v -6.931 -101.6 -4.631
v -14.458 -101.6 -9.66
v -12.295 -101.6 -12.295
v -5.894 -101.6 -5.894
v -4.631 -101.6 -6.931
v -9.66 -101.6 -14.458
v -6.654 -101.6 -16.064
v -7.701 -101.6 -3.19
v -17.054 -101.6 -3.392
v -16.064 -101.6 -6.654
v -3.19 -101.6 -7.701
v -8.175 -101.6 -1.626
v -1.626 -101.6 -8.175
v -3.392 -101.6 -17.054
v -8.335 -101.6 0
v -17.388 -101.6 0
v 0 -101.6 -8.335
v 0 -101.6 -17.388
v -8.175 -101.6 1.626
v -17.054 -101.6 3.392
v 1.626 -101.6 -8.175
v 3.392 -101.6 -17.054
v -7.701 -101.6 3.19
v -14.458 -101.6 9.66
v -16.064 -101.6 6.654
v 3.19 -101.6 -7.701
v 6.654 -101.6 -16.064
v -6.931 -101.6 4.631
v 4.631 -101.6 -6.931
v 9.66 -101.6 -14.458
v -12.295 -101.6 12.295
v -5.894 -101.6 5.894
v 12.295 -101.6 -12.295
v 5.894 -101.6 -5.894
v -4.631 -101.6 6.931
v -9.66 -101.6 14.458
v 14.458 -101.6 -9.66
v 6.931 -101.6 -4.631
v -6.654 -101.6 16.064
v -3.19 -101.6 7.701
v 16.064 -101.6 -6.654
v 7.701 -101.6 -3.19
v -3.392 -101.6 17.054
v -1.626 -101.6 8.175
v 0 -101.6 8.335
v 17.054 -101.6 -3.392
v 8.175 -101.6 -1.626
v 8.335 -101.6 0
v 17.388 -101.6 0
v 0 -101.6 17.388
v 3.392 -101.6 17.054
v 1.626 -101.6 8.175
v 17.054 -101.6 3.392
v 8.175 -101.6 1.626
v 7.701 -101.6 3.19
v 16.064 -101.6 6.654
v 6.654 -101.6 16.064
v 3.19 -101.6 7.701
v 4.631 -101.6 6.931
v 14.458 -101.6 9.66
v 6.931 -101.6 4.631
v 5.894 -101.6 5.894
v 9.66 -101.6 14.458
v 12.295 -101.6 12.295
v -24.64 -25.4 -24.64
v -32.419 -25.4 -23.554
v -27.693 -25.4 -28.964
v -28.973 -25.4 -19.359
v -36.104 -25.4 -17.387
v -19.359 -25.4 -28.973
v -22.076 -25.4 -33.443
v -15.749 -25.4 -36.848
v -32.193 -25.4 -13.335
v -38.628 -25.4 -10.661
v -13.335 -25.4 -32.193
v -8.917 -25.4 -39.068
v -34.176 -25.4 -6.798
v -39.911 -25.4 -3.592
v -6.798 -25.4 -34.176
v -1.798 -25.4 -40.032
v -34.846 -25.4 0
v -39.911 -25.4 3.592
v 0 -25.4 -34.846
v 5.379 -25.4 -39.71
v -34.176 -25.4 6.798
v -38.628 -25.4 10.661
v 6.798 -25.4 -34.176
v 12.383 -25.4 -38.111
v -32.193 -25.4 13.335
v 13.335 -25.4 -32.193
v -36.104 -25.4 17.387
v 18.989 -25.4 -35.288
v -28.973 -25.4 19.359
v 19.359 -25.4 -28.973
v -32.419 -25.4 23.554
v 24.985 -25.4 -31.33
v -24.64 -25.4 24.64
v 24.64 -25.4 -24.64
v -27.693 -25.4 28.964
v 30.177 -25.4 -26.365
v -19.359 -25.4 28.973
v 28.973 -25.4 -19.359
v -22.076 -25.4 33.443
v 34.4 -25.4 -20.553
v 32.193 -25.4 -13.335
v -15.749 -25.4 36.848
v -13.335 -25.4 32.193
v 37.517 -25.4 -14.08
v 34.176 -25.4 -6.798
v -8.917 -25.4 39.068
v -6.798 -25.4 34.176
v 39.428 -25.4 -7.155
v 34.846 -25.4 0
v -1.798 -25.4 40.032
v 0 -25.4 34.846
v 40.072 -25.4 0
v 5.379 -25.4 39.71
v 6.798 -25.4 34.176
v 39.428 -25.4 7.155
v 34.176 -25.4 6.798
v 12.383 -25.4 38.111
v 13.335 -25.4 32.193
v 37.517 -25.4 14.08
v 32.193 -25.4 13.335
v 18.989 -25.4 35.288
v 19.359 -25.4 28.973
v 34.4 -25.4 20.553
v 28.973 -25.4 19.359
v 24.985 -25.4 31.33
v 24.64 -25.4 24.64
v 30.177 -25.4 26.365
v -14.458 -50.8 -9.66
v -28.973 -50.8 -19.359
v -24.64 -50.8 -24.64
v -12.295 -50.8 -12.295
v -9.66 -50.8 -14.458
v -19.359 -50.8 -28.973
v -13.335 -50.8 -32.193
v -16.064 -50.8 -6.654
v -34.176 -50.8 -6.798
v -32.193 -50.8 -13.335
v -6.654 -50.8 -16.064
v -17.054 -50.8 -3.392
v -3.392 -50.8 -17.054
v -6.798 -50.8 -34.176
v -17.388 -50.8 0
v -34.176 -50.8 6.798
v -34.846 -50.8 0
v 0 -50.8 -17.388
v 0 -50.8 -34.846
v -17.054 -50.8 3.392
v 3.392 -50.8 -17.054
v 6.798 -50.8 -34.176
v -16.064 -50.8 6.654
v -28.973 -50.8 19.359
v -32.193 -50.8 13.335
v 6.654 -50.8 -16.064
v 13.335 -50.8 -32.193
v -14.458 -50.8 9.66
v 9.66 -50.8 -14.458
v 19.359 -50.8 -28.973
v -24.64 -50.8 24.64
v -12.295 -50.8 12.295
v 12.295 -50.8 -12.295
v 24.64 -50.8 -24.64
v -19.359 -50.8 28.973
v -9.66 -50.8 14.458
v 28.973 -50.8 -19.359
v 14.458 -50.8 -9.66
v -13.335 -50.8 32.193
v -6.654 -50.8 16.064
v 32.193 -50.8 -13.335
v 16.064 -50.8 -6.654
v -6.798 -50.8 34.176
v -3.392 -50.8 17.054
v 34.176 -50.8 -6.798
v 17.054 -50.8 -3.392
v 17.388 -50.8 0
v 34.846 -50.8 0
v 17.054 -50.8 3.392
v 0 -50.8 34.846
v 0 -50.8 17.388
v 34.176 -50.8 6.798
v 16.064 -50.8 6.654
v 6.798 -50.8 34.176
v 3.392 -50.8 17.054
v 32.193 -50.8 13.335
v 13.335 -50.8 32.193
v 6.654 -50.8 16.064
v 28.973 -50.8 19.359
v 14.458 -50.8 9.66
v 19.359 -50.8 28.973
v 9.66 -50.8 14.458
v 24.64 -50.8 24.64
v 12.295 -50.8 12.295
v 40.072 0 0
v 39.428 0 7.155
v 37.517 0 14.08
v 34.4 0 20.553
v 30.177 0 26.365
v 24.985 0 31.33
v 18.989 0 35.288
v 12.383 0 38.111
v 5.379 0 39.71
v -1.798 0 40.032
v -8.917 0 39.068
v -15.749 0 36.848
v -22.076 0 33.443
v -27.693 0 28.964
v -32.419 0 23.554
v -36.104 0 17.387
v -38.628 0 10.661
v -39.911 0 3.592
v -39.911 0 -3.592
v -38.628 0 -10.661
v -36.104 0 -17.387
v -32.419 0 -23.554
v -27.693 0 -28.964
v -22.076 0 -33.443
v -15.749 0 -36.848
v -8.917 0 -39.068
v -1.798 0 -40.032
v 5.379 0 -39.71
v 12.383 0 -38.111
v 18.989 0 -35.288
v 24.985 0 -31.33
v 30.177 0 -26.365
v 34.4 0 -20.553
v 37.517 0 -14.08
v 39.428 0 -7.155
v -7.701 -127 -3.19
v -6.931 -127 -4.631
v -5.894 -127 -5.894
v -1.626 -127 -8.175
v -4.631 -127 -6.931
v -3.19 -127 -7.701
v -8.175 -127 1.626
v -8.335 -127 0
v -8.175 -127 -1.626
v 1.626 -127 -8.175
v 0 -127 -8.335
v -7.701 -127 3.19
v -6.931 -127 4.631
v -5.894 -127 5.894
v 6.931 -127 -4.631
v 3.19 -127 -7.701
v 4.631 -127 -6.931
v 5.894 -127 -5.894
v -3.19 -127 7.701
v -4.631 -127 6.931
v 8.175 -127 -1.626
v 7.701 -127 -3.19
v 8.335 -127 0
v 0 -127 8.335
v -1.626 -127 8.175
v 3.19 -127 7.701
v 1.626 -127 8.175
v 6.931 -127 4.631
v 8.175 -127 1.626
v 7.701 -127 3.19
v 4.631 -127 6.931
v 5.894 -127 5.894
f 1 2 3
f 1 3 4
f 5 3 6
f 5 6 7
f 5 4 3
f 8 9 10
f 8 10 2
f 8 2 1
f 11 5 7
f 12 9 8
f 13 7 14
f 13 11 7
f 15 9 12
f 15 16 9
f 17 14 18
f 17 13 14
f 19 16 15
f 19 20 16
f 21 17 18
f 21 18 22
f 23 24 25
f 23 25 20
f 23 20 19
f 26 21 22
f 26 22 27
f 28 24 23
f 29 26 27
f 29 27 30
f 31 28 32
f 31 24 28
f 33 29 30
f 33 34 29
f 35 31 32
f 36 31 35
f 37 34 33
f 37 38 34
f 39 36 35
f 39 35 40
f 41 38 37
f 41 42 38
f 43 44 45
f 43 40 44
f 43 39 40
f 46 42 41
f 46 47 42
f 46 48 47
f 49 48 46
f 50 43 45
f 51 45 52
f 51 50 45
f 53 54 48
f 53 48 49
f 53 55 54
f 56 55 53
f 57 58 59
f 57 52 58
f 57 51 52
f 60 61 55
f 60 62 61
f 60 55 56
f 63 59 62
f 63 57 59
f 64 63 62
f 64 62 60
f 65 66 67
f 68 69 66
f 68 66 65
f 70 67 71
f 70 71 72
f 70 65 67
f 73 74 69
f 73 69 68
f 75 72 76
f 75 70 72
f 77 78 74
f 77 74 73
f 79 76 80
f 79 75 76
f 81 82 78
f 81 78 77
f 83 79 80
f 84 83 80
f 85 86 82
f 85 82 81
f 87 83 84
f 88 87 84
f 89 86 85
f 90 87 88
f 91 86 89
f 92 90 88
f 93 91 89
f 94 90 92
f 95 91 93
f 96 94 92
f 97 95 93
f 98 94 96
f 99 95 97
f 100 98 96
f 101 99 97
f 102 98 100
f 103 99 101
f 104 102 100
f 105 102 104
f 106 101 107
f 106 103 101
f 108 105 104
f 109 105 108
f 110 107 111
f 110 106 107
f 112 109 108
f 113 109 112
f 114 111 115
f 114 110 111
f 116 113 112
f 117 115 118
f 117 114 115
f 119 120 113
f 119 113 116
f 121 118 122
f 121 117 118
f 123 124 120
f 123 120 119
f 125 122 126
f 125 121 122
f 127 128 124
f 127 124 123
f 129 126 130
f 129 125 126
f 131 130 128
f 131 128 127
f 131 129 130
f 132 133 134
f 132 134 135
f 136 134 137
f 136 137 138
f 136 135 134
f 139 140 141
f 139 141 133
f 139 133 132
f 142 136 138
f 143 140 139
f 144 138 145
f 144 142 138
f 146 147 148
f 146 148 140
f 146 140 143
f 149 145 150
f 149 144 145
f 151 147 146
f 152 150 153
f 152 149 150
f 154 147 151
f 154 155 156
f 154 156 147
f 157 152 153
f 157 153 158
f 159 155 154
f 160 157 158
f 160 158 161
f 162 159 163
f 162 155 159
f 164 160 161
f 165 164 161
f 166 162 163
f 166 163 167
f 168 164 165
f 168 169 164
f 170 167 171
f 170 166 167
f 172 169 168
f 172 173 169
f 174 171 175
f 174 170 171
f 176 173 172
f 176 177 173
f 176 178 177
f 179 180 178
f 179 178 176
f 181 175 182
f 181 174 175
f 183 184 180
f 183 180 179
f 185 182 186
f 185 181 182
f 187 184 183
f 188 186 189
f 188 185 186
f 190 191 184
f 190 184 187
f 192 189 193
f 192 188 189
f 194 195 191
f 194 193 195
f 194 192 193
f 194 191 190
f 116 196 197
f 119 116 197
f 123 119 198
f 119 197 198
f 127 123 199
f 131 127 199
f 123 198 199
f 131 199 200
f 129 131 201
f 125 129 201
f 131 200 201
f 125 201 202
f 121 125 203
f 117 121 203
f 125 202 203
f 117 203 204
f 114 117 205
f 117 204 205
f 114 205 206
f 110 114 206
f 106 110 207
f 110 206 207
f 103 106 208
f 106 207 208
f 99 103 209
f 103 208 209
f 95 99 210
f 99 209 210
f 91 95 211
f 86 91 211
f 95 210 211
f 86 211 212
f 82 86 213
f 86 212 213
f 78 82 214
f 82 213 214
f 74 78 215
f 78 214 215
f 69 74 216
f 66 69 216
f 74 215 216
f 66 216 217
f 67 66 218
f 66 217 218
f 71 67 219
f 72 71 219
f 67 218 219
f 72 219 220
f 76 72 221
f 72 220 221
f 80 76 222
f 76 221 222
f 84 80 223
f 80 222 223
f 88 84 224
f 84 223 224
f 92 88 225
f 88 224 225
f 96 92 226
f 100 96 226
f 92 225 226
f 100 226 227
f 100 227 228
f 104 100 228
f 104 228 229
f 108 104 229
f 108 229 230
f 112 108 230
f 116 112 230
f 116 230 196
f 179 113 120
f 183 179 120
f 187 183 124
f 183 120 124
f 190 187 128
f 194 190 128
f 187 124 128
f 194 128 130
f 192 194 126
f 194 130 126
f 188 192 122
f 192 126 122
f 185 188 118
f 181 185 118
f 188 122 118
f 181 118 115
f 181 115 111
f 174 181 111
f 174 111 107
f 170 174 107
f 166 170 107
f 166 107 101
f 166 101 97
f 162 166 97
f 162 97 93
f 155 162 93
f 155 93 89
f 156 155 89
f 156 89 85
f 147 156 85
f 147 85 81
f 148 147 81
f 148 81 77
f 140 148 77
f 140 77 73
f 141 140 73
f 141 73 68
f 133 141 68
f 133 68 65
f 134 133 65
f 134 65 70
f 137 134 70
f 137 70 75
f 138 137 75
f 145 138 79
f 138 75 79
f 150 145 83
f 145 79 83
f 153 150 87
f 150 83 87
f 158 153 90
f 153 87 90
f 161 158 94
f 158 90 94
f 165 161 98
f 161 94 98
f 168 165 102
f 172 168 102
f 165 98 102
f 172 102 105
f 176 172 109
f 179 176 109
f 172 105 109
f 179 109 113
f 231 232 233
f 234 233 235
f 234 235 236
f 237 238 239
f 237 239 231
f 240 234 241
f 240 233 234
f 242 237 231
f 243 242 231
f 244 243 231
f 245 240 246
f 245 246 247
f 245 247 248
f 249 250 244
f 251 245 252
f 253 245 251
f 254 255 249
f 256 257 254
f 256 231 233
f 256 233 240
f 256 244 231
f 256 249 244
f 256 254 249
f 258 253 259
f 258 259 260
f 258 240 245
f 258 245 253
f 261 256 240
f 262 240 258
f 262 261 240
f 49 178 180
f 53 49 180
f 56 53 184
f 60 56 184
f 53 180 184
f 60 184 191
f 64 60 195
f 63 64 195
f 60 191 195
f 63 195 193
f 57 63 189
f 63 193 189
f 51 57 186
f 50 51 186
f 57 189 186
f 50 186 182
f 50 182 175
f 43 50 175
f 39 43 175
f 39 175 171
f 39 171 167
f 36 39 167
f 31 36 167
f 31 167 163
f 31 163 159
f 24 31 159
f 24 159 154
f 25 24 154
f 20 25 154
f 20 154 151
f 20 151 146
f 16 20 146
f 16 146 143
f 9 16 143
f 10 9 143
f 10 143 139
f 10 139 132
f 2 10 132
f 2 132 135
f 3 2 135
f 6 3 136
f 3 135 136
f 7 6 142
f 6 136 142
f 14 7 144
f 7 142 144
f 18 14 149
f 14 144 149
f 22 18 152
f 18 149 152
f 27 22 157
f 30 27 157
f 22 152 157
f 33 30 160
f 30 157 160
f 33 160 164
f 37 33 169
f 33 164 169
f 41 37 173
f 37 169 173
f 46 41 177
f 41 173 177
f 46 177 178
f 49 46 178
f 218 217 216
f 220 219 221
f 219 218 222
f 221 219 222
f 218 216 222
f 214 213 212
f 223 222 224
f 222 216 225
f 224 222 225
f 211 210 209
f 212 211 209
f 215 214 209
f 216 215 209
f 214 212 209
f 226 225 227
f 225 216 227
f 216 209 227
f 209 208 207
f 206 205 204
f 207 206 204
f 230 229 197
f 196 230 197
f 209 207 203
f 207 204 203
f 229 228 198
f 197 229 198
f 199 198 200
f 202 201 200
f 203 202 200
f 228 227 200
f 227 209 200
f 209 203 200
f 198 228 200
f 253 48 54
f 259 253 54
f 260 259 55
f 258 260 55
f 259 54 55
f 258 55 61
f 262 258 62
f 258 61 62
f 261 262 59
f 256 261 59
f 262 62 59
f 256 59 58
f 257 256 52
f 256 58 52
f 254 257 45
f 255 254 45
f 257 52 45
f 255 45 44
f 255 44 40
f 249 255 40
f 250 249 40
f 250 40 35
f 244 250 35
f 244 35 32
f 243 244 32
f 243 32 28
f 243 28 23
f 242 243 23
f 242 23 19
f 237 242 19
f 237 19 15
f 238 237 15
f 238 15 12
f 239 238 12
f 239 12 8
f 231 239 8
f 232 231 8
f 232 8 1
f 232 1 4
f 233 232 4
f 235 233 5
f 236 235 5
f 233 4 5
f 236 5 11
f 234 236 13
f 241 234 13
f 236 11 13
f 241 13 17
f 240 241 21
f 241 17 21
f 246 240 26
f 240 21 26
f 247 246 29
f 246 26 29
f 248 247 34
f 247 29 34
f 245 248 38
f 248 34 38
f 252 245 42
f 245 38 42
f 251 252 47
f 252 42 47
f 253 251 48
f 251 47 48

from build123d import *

# Parameters (mm, degrees)
F0_R     = 40.072412
F0_R_2   = 34.84556
F1_DEPTH = 25.4
F0_R_3   = 17.387916
F2_DEPTH = 50.8
F0_R_4   = 8.335342
F3_DEPTH = 101.6
F4_DEPTH = 127


with BuildPart() as f1:
    # F0 (on Front) → F1 (new body)
    with BuildSketch(Plane.XZ):
        Circle(F0_R)
        Circle(F0_R_2, mode=Mode.SUBTRACT)
    extrude(amount=F1_DEPTH)

    # F0 (on Front) → F2 (join)
    with BuildSketch(Plane.XZ):
        Circle(F0_R_2)
        Circle(F0_R_3, mode=Mode.SUBTRACT)
    extrude(amount=F2_DEPTH)

    # F0 (on Front) → F3 (join)
    with BuildSketch(Plane.XZ):
        Circle(F0_R_3)
        Circle(F0_R_4, mode=Mode.SUBTRACT)
    extrude(amount=F3_DEPTH)

    # F0 (on Front) → F4 (join)
    with BuildSketch(Plane.XZ):
        Circle(F0_R_4)
    extrude(amount=F4_DEPTH)


solid = f1.part
